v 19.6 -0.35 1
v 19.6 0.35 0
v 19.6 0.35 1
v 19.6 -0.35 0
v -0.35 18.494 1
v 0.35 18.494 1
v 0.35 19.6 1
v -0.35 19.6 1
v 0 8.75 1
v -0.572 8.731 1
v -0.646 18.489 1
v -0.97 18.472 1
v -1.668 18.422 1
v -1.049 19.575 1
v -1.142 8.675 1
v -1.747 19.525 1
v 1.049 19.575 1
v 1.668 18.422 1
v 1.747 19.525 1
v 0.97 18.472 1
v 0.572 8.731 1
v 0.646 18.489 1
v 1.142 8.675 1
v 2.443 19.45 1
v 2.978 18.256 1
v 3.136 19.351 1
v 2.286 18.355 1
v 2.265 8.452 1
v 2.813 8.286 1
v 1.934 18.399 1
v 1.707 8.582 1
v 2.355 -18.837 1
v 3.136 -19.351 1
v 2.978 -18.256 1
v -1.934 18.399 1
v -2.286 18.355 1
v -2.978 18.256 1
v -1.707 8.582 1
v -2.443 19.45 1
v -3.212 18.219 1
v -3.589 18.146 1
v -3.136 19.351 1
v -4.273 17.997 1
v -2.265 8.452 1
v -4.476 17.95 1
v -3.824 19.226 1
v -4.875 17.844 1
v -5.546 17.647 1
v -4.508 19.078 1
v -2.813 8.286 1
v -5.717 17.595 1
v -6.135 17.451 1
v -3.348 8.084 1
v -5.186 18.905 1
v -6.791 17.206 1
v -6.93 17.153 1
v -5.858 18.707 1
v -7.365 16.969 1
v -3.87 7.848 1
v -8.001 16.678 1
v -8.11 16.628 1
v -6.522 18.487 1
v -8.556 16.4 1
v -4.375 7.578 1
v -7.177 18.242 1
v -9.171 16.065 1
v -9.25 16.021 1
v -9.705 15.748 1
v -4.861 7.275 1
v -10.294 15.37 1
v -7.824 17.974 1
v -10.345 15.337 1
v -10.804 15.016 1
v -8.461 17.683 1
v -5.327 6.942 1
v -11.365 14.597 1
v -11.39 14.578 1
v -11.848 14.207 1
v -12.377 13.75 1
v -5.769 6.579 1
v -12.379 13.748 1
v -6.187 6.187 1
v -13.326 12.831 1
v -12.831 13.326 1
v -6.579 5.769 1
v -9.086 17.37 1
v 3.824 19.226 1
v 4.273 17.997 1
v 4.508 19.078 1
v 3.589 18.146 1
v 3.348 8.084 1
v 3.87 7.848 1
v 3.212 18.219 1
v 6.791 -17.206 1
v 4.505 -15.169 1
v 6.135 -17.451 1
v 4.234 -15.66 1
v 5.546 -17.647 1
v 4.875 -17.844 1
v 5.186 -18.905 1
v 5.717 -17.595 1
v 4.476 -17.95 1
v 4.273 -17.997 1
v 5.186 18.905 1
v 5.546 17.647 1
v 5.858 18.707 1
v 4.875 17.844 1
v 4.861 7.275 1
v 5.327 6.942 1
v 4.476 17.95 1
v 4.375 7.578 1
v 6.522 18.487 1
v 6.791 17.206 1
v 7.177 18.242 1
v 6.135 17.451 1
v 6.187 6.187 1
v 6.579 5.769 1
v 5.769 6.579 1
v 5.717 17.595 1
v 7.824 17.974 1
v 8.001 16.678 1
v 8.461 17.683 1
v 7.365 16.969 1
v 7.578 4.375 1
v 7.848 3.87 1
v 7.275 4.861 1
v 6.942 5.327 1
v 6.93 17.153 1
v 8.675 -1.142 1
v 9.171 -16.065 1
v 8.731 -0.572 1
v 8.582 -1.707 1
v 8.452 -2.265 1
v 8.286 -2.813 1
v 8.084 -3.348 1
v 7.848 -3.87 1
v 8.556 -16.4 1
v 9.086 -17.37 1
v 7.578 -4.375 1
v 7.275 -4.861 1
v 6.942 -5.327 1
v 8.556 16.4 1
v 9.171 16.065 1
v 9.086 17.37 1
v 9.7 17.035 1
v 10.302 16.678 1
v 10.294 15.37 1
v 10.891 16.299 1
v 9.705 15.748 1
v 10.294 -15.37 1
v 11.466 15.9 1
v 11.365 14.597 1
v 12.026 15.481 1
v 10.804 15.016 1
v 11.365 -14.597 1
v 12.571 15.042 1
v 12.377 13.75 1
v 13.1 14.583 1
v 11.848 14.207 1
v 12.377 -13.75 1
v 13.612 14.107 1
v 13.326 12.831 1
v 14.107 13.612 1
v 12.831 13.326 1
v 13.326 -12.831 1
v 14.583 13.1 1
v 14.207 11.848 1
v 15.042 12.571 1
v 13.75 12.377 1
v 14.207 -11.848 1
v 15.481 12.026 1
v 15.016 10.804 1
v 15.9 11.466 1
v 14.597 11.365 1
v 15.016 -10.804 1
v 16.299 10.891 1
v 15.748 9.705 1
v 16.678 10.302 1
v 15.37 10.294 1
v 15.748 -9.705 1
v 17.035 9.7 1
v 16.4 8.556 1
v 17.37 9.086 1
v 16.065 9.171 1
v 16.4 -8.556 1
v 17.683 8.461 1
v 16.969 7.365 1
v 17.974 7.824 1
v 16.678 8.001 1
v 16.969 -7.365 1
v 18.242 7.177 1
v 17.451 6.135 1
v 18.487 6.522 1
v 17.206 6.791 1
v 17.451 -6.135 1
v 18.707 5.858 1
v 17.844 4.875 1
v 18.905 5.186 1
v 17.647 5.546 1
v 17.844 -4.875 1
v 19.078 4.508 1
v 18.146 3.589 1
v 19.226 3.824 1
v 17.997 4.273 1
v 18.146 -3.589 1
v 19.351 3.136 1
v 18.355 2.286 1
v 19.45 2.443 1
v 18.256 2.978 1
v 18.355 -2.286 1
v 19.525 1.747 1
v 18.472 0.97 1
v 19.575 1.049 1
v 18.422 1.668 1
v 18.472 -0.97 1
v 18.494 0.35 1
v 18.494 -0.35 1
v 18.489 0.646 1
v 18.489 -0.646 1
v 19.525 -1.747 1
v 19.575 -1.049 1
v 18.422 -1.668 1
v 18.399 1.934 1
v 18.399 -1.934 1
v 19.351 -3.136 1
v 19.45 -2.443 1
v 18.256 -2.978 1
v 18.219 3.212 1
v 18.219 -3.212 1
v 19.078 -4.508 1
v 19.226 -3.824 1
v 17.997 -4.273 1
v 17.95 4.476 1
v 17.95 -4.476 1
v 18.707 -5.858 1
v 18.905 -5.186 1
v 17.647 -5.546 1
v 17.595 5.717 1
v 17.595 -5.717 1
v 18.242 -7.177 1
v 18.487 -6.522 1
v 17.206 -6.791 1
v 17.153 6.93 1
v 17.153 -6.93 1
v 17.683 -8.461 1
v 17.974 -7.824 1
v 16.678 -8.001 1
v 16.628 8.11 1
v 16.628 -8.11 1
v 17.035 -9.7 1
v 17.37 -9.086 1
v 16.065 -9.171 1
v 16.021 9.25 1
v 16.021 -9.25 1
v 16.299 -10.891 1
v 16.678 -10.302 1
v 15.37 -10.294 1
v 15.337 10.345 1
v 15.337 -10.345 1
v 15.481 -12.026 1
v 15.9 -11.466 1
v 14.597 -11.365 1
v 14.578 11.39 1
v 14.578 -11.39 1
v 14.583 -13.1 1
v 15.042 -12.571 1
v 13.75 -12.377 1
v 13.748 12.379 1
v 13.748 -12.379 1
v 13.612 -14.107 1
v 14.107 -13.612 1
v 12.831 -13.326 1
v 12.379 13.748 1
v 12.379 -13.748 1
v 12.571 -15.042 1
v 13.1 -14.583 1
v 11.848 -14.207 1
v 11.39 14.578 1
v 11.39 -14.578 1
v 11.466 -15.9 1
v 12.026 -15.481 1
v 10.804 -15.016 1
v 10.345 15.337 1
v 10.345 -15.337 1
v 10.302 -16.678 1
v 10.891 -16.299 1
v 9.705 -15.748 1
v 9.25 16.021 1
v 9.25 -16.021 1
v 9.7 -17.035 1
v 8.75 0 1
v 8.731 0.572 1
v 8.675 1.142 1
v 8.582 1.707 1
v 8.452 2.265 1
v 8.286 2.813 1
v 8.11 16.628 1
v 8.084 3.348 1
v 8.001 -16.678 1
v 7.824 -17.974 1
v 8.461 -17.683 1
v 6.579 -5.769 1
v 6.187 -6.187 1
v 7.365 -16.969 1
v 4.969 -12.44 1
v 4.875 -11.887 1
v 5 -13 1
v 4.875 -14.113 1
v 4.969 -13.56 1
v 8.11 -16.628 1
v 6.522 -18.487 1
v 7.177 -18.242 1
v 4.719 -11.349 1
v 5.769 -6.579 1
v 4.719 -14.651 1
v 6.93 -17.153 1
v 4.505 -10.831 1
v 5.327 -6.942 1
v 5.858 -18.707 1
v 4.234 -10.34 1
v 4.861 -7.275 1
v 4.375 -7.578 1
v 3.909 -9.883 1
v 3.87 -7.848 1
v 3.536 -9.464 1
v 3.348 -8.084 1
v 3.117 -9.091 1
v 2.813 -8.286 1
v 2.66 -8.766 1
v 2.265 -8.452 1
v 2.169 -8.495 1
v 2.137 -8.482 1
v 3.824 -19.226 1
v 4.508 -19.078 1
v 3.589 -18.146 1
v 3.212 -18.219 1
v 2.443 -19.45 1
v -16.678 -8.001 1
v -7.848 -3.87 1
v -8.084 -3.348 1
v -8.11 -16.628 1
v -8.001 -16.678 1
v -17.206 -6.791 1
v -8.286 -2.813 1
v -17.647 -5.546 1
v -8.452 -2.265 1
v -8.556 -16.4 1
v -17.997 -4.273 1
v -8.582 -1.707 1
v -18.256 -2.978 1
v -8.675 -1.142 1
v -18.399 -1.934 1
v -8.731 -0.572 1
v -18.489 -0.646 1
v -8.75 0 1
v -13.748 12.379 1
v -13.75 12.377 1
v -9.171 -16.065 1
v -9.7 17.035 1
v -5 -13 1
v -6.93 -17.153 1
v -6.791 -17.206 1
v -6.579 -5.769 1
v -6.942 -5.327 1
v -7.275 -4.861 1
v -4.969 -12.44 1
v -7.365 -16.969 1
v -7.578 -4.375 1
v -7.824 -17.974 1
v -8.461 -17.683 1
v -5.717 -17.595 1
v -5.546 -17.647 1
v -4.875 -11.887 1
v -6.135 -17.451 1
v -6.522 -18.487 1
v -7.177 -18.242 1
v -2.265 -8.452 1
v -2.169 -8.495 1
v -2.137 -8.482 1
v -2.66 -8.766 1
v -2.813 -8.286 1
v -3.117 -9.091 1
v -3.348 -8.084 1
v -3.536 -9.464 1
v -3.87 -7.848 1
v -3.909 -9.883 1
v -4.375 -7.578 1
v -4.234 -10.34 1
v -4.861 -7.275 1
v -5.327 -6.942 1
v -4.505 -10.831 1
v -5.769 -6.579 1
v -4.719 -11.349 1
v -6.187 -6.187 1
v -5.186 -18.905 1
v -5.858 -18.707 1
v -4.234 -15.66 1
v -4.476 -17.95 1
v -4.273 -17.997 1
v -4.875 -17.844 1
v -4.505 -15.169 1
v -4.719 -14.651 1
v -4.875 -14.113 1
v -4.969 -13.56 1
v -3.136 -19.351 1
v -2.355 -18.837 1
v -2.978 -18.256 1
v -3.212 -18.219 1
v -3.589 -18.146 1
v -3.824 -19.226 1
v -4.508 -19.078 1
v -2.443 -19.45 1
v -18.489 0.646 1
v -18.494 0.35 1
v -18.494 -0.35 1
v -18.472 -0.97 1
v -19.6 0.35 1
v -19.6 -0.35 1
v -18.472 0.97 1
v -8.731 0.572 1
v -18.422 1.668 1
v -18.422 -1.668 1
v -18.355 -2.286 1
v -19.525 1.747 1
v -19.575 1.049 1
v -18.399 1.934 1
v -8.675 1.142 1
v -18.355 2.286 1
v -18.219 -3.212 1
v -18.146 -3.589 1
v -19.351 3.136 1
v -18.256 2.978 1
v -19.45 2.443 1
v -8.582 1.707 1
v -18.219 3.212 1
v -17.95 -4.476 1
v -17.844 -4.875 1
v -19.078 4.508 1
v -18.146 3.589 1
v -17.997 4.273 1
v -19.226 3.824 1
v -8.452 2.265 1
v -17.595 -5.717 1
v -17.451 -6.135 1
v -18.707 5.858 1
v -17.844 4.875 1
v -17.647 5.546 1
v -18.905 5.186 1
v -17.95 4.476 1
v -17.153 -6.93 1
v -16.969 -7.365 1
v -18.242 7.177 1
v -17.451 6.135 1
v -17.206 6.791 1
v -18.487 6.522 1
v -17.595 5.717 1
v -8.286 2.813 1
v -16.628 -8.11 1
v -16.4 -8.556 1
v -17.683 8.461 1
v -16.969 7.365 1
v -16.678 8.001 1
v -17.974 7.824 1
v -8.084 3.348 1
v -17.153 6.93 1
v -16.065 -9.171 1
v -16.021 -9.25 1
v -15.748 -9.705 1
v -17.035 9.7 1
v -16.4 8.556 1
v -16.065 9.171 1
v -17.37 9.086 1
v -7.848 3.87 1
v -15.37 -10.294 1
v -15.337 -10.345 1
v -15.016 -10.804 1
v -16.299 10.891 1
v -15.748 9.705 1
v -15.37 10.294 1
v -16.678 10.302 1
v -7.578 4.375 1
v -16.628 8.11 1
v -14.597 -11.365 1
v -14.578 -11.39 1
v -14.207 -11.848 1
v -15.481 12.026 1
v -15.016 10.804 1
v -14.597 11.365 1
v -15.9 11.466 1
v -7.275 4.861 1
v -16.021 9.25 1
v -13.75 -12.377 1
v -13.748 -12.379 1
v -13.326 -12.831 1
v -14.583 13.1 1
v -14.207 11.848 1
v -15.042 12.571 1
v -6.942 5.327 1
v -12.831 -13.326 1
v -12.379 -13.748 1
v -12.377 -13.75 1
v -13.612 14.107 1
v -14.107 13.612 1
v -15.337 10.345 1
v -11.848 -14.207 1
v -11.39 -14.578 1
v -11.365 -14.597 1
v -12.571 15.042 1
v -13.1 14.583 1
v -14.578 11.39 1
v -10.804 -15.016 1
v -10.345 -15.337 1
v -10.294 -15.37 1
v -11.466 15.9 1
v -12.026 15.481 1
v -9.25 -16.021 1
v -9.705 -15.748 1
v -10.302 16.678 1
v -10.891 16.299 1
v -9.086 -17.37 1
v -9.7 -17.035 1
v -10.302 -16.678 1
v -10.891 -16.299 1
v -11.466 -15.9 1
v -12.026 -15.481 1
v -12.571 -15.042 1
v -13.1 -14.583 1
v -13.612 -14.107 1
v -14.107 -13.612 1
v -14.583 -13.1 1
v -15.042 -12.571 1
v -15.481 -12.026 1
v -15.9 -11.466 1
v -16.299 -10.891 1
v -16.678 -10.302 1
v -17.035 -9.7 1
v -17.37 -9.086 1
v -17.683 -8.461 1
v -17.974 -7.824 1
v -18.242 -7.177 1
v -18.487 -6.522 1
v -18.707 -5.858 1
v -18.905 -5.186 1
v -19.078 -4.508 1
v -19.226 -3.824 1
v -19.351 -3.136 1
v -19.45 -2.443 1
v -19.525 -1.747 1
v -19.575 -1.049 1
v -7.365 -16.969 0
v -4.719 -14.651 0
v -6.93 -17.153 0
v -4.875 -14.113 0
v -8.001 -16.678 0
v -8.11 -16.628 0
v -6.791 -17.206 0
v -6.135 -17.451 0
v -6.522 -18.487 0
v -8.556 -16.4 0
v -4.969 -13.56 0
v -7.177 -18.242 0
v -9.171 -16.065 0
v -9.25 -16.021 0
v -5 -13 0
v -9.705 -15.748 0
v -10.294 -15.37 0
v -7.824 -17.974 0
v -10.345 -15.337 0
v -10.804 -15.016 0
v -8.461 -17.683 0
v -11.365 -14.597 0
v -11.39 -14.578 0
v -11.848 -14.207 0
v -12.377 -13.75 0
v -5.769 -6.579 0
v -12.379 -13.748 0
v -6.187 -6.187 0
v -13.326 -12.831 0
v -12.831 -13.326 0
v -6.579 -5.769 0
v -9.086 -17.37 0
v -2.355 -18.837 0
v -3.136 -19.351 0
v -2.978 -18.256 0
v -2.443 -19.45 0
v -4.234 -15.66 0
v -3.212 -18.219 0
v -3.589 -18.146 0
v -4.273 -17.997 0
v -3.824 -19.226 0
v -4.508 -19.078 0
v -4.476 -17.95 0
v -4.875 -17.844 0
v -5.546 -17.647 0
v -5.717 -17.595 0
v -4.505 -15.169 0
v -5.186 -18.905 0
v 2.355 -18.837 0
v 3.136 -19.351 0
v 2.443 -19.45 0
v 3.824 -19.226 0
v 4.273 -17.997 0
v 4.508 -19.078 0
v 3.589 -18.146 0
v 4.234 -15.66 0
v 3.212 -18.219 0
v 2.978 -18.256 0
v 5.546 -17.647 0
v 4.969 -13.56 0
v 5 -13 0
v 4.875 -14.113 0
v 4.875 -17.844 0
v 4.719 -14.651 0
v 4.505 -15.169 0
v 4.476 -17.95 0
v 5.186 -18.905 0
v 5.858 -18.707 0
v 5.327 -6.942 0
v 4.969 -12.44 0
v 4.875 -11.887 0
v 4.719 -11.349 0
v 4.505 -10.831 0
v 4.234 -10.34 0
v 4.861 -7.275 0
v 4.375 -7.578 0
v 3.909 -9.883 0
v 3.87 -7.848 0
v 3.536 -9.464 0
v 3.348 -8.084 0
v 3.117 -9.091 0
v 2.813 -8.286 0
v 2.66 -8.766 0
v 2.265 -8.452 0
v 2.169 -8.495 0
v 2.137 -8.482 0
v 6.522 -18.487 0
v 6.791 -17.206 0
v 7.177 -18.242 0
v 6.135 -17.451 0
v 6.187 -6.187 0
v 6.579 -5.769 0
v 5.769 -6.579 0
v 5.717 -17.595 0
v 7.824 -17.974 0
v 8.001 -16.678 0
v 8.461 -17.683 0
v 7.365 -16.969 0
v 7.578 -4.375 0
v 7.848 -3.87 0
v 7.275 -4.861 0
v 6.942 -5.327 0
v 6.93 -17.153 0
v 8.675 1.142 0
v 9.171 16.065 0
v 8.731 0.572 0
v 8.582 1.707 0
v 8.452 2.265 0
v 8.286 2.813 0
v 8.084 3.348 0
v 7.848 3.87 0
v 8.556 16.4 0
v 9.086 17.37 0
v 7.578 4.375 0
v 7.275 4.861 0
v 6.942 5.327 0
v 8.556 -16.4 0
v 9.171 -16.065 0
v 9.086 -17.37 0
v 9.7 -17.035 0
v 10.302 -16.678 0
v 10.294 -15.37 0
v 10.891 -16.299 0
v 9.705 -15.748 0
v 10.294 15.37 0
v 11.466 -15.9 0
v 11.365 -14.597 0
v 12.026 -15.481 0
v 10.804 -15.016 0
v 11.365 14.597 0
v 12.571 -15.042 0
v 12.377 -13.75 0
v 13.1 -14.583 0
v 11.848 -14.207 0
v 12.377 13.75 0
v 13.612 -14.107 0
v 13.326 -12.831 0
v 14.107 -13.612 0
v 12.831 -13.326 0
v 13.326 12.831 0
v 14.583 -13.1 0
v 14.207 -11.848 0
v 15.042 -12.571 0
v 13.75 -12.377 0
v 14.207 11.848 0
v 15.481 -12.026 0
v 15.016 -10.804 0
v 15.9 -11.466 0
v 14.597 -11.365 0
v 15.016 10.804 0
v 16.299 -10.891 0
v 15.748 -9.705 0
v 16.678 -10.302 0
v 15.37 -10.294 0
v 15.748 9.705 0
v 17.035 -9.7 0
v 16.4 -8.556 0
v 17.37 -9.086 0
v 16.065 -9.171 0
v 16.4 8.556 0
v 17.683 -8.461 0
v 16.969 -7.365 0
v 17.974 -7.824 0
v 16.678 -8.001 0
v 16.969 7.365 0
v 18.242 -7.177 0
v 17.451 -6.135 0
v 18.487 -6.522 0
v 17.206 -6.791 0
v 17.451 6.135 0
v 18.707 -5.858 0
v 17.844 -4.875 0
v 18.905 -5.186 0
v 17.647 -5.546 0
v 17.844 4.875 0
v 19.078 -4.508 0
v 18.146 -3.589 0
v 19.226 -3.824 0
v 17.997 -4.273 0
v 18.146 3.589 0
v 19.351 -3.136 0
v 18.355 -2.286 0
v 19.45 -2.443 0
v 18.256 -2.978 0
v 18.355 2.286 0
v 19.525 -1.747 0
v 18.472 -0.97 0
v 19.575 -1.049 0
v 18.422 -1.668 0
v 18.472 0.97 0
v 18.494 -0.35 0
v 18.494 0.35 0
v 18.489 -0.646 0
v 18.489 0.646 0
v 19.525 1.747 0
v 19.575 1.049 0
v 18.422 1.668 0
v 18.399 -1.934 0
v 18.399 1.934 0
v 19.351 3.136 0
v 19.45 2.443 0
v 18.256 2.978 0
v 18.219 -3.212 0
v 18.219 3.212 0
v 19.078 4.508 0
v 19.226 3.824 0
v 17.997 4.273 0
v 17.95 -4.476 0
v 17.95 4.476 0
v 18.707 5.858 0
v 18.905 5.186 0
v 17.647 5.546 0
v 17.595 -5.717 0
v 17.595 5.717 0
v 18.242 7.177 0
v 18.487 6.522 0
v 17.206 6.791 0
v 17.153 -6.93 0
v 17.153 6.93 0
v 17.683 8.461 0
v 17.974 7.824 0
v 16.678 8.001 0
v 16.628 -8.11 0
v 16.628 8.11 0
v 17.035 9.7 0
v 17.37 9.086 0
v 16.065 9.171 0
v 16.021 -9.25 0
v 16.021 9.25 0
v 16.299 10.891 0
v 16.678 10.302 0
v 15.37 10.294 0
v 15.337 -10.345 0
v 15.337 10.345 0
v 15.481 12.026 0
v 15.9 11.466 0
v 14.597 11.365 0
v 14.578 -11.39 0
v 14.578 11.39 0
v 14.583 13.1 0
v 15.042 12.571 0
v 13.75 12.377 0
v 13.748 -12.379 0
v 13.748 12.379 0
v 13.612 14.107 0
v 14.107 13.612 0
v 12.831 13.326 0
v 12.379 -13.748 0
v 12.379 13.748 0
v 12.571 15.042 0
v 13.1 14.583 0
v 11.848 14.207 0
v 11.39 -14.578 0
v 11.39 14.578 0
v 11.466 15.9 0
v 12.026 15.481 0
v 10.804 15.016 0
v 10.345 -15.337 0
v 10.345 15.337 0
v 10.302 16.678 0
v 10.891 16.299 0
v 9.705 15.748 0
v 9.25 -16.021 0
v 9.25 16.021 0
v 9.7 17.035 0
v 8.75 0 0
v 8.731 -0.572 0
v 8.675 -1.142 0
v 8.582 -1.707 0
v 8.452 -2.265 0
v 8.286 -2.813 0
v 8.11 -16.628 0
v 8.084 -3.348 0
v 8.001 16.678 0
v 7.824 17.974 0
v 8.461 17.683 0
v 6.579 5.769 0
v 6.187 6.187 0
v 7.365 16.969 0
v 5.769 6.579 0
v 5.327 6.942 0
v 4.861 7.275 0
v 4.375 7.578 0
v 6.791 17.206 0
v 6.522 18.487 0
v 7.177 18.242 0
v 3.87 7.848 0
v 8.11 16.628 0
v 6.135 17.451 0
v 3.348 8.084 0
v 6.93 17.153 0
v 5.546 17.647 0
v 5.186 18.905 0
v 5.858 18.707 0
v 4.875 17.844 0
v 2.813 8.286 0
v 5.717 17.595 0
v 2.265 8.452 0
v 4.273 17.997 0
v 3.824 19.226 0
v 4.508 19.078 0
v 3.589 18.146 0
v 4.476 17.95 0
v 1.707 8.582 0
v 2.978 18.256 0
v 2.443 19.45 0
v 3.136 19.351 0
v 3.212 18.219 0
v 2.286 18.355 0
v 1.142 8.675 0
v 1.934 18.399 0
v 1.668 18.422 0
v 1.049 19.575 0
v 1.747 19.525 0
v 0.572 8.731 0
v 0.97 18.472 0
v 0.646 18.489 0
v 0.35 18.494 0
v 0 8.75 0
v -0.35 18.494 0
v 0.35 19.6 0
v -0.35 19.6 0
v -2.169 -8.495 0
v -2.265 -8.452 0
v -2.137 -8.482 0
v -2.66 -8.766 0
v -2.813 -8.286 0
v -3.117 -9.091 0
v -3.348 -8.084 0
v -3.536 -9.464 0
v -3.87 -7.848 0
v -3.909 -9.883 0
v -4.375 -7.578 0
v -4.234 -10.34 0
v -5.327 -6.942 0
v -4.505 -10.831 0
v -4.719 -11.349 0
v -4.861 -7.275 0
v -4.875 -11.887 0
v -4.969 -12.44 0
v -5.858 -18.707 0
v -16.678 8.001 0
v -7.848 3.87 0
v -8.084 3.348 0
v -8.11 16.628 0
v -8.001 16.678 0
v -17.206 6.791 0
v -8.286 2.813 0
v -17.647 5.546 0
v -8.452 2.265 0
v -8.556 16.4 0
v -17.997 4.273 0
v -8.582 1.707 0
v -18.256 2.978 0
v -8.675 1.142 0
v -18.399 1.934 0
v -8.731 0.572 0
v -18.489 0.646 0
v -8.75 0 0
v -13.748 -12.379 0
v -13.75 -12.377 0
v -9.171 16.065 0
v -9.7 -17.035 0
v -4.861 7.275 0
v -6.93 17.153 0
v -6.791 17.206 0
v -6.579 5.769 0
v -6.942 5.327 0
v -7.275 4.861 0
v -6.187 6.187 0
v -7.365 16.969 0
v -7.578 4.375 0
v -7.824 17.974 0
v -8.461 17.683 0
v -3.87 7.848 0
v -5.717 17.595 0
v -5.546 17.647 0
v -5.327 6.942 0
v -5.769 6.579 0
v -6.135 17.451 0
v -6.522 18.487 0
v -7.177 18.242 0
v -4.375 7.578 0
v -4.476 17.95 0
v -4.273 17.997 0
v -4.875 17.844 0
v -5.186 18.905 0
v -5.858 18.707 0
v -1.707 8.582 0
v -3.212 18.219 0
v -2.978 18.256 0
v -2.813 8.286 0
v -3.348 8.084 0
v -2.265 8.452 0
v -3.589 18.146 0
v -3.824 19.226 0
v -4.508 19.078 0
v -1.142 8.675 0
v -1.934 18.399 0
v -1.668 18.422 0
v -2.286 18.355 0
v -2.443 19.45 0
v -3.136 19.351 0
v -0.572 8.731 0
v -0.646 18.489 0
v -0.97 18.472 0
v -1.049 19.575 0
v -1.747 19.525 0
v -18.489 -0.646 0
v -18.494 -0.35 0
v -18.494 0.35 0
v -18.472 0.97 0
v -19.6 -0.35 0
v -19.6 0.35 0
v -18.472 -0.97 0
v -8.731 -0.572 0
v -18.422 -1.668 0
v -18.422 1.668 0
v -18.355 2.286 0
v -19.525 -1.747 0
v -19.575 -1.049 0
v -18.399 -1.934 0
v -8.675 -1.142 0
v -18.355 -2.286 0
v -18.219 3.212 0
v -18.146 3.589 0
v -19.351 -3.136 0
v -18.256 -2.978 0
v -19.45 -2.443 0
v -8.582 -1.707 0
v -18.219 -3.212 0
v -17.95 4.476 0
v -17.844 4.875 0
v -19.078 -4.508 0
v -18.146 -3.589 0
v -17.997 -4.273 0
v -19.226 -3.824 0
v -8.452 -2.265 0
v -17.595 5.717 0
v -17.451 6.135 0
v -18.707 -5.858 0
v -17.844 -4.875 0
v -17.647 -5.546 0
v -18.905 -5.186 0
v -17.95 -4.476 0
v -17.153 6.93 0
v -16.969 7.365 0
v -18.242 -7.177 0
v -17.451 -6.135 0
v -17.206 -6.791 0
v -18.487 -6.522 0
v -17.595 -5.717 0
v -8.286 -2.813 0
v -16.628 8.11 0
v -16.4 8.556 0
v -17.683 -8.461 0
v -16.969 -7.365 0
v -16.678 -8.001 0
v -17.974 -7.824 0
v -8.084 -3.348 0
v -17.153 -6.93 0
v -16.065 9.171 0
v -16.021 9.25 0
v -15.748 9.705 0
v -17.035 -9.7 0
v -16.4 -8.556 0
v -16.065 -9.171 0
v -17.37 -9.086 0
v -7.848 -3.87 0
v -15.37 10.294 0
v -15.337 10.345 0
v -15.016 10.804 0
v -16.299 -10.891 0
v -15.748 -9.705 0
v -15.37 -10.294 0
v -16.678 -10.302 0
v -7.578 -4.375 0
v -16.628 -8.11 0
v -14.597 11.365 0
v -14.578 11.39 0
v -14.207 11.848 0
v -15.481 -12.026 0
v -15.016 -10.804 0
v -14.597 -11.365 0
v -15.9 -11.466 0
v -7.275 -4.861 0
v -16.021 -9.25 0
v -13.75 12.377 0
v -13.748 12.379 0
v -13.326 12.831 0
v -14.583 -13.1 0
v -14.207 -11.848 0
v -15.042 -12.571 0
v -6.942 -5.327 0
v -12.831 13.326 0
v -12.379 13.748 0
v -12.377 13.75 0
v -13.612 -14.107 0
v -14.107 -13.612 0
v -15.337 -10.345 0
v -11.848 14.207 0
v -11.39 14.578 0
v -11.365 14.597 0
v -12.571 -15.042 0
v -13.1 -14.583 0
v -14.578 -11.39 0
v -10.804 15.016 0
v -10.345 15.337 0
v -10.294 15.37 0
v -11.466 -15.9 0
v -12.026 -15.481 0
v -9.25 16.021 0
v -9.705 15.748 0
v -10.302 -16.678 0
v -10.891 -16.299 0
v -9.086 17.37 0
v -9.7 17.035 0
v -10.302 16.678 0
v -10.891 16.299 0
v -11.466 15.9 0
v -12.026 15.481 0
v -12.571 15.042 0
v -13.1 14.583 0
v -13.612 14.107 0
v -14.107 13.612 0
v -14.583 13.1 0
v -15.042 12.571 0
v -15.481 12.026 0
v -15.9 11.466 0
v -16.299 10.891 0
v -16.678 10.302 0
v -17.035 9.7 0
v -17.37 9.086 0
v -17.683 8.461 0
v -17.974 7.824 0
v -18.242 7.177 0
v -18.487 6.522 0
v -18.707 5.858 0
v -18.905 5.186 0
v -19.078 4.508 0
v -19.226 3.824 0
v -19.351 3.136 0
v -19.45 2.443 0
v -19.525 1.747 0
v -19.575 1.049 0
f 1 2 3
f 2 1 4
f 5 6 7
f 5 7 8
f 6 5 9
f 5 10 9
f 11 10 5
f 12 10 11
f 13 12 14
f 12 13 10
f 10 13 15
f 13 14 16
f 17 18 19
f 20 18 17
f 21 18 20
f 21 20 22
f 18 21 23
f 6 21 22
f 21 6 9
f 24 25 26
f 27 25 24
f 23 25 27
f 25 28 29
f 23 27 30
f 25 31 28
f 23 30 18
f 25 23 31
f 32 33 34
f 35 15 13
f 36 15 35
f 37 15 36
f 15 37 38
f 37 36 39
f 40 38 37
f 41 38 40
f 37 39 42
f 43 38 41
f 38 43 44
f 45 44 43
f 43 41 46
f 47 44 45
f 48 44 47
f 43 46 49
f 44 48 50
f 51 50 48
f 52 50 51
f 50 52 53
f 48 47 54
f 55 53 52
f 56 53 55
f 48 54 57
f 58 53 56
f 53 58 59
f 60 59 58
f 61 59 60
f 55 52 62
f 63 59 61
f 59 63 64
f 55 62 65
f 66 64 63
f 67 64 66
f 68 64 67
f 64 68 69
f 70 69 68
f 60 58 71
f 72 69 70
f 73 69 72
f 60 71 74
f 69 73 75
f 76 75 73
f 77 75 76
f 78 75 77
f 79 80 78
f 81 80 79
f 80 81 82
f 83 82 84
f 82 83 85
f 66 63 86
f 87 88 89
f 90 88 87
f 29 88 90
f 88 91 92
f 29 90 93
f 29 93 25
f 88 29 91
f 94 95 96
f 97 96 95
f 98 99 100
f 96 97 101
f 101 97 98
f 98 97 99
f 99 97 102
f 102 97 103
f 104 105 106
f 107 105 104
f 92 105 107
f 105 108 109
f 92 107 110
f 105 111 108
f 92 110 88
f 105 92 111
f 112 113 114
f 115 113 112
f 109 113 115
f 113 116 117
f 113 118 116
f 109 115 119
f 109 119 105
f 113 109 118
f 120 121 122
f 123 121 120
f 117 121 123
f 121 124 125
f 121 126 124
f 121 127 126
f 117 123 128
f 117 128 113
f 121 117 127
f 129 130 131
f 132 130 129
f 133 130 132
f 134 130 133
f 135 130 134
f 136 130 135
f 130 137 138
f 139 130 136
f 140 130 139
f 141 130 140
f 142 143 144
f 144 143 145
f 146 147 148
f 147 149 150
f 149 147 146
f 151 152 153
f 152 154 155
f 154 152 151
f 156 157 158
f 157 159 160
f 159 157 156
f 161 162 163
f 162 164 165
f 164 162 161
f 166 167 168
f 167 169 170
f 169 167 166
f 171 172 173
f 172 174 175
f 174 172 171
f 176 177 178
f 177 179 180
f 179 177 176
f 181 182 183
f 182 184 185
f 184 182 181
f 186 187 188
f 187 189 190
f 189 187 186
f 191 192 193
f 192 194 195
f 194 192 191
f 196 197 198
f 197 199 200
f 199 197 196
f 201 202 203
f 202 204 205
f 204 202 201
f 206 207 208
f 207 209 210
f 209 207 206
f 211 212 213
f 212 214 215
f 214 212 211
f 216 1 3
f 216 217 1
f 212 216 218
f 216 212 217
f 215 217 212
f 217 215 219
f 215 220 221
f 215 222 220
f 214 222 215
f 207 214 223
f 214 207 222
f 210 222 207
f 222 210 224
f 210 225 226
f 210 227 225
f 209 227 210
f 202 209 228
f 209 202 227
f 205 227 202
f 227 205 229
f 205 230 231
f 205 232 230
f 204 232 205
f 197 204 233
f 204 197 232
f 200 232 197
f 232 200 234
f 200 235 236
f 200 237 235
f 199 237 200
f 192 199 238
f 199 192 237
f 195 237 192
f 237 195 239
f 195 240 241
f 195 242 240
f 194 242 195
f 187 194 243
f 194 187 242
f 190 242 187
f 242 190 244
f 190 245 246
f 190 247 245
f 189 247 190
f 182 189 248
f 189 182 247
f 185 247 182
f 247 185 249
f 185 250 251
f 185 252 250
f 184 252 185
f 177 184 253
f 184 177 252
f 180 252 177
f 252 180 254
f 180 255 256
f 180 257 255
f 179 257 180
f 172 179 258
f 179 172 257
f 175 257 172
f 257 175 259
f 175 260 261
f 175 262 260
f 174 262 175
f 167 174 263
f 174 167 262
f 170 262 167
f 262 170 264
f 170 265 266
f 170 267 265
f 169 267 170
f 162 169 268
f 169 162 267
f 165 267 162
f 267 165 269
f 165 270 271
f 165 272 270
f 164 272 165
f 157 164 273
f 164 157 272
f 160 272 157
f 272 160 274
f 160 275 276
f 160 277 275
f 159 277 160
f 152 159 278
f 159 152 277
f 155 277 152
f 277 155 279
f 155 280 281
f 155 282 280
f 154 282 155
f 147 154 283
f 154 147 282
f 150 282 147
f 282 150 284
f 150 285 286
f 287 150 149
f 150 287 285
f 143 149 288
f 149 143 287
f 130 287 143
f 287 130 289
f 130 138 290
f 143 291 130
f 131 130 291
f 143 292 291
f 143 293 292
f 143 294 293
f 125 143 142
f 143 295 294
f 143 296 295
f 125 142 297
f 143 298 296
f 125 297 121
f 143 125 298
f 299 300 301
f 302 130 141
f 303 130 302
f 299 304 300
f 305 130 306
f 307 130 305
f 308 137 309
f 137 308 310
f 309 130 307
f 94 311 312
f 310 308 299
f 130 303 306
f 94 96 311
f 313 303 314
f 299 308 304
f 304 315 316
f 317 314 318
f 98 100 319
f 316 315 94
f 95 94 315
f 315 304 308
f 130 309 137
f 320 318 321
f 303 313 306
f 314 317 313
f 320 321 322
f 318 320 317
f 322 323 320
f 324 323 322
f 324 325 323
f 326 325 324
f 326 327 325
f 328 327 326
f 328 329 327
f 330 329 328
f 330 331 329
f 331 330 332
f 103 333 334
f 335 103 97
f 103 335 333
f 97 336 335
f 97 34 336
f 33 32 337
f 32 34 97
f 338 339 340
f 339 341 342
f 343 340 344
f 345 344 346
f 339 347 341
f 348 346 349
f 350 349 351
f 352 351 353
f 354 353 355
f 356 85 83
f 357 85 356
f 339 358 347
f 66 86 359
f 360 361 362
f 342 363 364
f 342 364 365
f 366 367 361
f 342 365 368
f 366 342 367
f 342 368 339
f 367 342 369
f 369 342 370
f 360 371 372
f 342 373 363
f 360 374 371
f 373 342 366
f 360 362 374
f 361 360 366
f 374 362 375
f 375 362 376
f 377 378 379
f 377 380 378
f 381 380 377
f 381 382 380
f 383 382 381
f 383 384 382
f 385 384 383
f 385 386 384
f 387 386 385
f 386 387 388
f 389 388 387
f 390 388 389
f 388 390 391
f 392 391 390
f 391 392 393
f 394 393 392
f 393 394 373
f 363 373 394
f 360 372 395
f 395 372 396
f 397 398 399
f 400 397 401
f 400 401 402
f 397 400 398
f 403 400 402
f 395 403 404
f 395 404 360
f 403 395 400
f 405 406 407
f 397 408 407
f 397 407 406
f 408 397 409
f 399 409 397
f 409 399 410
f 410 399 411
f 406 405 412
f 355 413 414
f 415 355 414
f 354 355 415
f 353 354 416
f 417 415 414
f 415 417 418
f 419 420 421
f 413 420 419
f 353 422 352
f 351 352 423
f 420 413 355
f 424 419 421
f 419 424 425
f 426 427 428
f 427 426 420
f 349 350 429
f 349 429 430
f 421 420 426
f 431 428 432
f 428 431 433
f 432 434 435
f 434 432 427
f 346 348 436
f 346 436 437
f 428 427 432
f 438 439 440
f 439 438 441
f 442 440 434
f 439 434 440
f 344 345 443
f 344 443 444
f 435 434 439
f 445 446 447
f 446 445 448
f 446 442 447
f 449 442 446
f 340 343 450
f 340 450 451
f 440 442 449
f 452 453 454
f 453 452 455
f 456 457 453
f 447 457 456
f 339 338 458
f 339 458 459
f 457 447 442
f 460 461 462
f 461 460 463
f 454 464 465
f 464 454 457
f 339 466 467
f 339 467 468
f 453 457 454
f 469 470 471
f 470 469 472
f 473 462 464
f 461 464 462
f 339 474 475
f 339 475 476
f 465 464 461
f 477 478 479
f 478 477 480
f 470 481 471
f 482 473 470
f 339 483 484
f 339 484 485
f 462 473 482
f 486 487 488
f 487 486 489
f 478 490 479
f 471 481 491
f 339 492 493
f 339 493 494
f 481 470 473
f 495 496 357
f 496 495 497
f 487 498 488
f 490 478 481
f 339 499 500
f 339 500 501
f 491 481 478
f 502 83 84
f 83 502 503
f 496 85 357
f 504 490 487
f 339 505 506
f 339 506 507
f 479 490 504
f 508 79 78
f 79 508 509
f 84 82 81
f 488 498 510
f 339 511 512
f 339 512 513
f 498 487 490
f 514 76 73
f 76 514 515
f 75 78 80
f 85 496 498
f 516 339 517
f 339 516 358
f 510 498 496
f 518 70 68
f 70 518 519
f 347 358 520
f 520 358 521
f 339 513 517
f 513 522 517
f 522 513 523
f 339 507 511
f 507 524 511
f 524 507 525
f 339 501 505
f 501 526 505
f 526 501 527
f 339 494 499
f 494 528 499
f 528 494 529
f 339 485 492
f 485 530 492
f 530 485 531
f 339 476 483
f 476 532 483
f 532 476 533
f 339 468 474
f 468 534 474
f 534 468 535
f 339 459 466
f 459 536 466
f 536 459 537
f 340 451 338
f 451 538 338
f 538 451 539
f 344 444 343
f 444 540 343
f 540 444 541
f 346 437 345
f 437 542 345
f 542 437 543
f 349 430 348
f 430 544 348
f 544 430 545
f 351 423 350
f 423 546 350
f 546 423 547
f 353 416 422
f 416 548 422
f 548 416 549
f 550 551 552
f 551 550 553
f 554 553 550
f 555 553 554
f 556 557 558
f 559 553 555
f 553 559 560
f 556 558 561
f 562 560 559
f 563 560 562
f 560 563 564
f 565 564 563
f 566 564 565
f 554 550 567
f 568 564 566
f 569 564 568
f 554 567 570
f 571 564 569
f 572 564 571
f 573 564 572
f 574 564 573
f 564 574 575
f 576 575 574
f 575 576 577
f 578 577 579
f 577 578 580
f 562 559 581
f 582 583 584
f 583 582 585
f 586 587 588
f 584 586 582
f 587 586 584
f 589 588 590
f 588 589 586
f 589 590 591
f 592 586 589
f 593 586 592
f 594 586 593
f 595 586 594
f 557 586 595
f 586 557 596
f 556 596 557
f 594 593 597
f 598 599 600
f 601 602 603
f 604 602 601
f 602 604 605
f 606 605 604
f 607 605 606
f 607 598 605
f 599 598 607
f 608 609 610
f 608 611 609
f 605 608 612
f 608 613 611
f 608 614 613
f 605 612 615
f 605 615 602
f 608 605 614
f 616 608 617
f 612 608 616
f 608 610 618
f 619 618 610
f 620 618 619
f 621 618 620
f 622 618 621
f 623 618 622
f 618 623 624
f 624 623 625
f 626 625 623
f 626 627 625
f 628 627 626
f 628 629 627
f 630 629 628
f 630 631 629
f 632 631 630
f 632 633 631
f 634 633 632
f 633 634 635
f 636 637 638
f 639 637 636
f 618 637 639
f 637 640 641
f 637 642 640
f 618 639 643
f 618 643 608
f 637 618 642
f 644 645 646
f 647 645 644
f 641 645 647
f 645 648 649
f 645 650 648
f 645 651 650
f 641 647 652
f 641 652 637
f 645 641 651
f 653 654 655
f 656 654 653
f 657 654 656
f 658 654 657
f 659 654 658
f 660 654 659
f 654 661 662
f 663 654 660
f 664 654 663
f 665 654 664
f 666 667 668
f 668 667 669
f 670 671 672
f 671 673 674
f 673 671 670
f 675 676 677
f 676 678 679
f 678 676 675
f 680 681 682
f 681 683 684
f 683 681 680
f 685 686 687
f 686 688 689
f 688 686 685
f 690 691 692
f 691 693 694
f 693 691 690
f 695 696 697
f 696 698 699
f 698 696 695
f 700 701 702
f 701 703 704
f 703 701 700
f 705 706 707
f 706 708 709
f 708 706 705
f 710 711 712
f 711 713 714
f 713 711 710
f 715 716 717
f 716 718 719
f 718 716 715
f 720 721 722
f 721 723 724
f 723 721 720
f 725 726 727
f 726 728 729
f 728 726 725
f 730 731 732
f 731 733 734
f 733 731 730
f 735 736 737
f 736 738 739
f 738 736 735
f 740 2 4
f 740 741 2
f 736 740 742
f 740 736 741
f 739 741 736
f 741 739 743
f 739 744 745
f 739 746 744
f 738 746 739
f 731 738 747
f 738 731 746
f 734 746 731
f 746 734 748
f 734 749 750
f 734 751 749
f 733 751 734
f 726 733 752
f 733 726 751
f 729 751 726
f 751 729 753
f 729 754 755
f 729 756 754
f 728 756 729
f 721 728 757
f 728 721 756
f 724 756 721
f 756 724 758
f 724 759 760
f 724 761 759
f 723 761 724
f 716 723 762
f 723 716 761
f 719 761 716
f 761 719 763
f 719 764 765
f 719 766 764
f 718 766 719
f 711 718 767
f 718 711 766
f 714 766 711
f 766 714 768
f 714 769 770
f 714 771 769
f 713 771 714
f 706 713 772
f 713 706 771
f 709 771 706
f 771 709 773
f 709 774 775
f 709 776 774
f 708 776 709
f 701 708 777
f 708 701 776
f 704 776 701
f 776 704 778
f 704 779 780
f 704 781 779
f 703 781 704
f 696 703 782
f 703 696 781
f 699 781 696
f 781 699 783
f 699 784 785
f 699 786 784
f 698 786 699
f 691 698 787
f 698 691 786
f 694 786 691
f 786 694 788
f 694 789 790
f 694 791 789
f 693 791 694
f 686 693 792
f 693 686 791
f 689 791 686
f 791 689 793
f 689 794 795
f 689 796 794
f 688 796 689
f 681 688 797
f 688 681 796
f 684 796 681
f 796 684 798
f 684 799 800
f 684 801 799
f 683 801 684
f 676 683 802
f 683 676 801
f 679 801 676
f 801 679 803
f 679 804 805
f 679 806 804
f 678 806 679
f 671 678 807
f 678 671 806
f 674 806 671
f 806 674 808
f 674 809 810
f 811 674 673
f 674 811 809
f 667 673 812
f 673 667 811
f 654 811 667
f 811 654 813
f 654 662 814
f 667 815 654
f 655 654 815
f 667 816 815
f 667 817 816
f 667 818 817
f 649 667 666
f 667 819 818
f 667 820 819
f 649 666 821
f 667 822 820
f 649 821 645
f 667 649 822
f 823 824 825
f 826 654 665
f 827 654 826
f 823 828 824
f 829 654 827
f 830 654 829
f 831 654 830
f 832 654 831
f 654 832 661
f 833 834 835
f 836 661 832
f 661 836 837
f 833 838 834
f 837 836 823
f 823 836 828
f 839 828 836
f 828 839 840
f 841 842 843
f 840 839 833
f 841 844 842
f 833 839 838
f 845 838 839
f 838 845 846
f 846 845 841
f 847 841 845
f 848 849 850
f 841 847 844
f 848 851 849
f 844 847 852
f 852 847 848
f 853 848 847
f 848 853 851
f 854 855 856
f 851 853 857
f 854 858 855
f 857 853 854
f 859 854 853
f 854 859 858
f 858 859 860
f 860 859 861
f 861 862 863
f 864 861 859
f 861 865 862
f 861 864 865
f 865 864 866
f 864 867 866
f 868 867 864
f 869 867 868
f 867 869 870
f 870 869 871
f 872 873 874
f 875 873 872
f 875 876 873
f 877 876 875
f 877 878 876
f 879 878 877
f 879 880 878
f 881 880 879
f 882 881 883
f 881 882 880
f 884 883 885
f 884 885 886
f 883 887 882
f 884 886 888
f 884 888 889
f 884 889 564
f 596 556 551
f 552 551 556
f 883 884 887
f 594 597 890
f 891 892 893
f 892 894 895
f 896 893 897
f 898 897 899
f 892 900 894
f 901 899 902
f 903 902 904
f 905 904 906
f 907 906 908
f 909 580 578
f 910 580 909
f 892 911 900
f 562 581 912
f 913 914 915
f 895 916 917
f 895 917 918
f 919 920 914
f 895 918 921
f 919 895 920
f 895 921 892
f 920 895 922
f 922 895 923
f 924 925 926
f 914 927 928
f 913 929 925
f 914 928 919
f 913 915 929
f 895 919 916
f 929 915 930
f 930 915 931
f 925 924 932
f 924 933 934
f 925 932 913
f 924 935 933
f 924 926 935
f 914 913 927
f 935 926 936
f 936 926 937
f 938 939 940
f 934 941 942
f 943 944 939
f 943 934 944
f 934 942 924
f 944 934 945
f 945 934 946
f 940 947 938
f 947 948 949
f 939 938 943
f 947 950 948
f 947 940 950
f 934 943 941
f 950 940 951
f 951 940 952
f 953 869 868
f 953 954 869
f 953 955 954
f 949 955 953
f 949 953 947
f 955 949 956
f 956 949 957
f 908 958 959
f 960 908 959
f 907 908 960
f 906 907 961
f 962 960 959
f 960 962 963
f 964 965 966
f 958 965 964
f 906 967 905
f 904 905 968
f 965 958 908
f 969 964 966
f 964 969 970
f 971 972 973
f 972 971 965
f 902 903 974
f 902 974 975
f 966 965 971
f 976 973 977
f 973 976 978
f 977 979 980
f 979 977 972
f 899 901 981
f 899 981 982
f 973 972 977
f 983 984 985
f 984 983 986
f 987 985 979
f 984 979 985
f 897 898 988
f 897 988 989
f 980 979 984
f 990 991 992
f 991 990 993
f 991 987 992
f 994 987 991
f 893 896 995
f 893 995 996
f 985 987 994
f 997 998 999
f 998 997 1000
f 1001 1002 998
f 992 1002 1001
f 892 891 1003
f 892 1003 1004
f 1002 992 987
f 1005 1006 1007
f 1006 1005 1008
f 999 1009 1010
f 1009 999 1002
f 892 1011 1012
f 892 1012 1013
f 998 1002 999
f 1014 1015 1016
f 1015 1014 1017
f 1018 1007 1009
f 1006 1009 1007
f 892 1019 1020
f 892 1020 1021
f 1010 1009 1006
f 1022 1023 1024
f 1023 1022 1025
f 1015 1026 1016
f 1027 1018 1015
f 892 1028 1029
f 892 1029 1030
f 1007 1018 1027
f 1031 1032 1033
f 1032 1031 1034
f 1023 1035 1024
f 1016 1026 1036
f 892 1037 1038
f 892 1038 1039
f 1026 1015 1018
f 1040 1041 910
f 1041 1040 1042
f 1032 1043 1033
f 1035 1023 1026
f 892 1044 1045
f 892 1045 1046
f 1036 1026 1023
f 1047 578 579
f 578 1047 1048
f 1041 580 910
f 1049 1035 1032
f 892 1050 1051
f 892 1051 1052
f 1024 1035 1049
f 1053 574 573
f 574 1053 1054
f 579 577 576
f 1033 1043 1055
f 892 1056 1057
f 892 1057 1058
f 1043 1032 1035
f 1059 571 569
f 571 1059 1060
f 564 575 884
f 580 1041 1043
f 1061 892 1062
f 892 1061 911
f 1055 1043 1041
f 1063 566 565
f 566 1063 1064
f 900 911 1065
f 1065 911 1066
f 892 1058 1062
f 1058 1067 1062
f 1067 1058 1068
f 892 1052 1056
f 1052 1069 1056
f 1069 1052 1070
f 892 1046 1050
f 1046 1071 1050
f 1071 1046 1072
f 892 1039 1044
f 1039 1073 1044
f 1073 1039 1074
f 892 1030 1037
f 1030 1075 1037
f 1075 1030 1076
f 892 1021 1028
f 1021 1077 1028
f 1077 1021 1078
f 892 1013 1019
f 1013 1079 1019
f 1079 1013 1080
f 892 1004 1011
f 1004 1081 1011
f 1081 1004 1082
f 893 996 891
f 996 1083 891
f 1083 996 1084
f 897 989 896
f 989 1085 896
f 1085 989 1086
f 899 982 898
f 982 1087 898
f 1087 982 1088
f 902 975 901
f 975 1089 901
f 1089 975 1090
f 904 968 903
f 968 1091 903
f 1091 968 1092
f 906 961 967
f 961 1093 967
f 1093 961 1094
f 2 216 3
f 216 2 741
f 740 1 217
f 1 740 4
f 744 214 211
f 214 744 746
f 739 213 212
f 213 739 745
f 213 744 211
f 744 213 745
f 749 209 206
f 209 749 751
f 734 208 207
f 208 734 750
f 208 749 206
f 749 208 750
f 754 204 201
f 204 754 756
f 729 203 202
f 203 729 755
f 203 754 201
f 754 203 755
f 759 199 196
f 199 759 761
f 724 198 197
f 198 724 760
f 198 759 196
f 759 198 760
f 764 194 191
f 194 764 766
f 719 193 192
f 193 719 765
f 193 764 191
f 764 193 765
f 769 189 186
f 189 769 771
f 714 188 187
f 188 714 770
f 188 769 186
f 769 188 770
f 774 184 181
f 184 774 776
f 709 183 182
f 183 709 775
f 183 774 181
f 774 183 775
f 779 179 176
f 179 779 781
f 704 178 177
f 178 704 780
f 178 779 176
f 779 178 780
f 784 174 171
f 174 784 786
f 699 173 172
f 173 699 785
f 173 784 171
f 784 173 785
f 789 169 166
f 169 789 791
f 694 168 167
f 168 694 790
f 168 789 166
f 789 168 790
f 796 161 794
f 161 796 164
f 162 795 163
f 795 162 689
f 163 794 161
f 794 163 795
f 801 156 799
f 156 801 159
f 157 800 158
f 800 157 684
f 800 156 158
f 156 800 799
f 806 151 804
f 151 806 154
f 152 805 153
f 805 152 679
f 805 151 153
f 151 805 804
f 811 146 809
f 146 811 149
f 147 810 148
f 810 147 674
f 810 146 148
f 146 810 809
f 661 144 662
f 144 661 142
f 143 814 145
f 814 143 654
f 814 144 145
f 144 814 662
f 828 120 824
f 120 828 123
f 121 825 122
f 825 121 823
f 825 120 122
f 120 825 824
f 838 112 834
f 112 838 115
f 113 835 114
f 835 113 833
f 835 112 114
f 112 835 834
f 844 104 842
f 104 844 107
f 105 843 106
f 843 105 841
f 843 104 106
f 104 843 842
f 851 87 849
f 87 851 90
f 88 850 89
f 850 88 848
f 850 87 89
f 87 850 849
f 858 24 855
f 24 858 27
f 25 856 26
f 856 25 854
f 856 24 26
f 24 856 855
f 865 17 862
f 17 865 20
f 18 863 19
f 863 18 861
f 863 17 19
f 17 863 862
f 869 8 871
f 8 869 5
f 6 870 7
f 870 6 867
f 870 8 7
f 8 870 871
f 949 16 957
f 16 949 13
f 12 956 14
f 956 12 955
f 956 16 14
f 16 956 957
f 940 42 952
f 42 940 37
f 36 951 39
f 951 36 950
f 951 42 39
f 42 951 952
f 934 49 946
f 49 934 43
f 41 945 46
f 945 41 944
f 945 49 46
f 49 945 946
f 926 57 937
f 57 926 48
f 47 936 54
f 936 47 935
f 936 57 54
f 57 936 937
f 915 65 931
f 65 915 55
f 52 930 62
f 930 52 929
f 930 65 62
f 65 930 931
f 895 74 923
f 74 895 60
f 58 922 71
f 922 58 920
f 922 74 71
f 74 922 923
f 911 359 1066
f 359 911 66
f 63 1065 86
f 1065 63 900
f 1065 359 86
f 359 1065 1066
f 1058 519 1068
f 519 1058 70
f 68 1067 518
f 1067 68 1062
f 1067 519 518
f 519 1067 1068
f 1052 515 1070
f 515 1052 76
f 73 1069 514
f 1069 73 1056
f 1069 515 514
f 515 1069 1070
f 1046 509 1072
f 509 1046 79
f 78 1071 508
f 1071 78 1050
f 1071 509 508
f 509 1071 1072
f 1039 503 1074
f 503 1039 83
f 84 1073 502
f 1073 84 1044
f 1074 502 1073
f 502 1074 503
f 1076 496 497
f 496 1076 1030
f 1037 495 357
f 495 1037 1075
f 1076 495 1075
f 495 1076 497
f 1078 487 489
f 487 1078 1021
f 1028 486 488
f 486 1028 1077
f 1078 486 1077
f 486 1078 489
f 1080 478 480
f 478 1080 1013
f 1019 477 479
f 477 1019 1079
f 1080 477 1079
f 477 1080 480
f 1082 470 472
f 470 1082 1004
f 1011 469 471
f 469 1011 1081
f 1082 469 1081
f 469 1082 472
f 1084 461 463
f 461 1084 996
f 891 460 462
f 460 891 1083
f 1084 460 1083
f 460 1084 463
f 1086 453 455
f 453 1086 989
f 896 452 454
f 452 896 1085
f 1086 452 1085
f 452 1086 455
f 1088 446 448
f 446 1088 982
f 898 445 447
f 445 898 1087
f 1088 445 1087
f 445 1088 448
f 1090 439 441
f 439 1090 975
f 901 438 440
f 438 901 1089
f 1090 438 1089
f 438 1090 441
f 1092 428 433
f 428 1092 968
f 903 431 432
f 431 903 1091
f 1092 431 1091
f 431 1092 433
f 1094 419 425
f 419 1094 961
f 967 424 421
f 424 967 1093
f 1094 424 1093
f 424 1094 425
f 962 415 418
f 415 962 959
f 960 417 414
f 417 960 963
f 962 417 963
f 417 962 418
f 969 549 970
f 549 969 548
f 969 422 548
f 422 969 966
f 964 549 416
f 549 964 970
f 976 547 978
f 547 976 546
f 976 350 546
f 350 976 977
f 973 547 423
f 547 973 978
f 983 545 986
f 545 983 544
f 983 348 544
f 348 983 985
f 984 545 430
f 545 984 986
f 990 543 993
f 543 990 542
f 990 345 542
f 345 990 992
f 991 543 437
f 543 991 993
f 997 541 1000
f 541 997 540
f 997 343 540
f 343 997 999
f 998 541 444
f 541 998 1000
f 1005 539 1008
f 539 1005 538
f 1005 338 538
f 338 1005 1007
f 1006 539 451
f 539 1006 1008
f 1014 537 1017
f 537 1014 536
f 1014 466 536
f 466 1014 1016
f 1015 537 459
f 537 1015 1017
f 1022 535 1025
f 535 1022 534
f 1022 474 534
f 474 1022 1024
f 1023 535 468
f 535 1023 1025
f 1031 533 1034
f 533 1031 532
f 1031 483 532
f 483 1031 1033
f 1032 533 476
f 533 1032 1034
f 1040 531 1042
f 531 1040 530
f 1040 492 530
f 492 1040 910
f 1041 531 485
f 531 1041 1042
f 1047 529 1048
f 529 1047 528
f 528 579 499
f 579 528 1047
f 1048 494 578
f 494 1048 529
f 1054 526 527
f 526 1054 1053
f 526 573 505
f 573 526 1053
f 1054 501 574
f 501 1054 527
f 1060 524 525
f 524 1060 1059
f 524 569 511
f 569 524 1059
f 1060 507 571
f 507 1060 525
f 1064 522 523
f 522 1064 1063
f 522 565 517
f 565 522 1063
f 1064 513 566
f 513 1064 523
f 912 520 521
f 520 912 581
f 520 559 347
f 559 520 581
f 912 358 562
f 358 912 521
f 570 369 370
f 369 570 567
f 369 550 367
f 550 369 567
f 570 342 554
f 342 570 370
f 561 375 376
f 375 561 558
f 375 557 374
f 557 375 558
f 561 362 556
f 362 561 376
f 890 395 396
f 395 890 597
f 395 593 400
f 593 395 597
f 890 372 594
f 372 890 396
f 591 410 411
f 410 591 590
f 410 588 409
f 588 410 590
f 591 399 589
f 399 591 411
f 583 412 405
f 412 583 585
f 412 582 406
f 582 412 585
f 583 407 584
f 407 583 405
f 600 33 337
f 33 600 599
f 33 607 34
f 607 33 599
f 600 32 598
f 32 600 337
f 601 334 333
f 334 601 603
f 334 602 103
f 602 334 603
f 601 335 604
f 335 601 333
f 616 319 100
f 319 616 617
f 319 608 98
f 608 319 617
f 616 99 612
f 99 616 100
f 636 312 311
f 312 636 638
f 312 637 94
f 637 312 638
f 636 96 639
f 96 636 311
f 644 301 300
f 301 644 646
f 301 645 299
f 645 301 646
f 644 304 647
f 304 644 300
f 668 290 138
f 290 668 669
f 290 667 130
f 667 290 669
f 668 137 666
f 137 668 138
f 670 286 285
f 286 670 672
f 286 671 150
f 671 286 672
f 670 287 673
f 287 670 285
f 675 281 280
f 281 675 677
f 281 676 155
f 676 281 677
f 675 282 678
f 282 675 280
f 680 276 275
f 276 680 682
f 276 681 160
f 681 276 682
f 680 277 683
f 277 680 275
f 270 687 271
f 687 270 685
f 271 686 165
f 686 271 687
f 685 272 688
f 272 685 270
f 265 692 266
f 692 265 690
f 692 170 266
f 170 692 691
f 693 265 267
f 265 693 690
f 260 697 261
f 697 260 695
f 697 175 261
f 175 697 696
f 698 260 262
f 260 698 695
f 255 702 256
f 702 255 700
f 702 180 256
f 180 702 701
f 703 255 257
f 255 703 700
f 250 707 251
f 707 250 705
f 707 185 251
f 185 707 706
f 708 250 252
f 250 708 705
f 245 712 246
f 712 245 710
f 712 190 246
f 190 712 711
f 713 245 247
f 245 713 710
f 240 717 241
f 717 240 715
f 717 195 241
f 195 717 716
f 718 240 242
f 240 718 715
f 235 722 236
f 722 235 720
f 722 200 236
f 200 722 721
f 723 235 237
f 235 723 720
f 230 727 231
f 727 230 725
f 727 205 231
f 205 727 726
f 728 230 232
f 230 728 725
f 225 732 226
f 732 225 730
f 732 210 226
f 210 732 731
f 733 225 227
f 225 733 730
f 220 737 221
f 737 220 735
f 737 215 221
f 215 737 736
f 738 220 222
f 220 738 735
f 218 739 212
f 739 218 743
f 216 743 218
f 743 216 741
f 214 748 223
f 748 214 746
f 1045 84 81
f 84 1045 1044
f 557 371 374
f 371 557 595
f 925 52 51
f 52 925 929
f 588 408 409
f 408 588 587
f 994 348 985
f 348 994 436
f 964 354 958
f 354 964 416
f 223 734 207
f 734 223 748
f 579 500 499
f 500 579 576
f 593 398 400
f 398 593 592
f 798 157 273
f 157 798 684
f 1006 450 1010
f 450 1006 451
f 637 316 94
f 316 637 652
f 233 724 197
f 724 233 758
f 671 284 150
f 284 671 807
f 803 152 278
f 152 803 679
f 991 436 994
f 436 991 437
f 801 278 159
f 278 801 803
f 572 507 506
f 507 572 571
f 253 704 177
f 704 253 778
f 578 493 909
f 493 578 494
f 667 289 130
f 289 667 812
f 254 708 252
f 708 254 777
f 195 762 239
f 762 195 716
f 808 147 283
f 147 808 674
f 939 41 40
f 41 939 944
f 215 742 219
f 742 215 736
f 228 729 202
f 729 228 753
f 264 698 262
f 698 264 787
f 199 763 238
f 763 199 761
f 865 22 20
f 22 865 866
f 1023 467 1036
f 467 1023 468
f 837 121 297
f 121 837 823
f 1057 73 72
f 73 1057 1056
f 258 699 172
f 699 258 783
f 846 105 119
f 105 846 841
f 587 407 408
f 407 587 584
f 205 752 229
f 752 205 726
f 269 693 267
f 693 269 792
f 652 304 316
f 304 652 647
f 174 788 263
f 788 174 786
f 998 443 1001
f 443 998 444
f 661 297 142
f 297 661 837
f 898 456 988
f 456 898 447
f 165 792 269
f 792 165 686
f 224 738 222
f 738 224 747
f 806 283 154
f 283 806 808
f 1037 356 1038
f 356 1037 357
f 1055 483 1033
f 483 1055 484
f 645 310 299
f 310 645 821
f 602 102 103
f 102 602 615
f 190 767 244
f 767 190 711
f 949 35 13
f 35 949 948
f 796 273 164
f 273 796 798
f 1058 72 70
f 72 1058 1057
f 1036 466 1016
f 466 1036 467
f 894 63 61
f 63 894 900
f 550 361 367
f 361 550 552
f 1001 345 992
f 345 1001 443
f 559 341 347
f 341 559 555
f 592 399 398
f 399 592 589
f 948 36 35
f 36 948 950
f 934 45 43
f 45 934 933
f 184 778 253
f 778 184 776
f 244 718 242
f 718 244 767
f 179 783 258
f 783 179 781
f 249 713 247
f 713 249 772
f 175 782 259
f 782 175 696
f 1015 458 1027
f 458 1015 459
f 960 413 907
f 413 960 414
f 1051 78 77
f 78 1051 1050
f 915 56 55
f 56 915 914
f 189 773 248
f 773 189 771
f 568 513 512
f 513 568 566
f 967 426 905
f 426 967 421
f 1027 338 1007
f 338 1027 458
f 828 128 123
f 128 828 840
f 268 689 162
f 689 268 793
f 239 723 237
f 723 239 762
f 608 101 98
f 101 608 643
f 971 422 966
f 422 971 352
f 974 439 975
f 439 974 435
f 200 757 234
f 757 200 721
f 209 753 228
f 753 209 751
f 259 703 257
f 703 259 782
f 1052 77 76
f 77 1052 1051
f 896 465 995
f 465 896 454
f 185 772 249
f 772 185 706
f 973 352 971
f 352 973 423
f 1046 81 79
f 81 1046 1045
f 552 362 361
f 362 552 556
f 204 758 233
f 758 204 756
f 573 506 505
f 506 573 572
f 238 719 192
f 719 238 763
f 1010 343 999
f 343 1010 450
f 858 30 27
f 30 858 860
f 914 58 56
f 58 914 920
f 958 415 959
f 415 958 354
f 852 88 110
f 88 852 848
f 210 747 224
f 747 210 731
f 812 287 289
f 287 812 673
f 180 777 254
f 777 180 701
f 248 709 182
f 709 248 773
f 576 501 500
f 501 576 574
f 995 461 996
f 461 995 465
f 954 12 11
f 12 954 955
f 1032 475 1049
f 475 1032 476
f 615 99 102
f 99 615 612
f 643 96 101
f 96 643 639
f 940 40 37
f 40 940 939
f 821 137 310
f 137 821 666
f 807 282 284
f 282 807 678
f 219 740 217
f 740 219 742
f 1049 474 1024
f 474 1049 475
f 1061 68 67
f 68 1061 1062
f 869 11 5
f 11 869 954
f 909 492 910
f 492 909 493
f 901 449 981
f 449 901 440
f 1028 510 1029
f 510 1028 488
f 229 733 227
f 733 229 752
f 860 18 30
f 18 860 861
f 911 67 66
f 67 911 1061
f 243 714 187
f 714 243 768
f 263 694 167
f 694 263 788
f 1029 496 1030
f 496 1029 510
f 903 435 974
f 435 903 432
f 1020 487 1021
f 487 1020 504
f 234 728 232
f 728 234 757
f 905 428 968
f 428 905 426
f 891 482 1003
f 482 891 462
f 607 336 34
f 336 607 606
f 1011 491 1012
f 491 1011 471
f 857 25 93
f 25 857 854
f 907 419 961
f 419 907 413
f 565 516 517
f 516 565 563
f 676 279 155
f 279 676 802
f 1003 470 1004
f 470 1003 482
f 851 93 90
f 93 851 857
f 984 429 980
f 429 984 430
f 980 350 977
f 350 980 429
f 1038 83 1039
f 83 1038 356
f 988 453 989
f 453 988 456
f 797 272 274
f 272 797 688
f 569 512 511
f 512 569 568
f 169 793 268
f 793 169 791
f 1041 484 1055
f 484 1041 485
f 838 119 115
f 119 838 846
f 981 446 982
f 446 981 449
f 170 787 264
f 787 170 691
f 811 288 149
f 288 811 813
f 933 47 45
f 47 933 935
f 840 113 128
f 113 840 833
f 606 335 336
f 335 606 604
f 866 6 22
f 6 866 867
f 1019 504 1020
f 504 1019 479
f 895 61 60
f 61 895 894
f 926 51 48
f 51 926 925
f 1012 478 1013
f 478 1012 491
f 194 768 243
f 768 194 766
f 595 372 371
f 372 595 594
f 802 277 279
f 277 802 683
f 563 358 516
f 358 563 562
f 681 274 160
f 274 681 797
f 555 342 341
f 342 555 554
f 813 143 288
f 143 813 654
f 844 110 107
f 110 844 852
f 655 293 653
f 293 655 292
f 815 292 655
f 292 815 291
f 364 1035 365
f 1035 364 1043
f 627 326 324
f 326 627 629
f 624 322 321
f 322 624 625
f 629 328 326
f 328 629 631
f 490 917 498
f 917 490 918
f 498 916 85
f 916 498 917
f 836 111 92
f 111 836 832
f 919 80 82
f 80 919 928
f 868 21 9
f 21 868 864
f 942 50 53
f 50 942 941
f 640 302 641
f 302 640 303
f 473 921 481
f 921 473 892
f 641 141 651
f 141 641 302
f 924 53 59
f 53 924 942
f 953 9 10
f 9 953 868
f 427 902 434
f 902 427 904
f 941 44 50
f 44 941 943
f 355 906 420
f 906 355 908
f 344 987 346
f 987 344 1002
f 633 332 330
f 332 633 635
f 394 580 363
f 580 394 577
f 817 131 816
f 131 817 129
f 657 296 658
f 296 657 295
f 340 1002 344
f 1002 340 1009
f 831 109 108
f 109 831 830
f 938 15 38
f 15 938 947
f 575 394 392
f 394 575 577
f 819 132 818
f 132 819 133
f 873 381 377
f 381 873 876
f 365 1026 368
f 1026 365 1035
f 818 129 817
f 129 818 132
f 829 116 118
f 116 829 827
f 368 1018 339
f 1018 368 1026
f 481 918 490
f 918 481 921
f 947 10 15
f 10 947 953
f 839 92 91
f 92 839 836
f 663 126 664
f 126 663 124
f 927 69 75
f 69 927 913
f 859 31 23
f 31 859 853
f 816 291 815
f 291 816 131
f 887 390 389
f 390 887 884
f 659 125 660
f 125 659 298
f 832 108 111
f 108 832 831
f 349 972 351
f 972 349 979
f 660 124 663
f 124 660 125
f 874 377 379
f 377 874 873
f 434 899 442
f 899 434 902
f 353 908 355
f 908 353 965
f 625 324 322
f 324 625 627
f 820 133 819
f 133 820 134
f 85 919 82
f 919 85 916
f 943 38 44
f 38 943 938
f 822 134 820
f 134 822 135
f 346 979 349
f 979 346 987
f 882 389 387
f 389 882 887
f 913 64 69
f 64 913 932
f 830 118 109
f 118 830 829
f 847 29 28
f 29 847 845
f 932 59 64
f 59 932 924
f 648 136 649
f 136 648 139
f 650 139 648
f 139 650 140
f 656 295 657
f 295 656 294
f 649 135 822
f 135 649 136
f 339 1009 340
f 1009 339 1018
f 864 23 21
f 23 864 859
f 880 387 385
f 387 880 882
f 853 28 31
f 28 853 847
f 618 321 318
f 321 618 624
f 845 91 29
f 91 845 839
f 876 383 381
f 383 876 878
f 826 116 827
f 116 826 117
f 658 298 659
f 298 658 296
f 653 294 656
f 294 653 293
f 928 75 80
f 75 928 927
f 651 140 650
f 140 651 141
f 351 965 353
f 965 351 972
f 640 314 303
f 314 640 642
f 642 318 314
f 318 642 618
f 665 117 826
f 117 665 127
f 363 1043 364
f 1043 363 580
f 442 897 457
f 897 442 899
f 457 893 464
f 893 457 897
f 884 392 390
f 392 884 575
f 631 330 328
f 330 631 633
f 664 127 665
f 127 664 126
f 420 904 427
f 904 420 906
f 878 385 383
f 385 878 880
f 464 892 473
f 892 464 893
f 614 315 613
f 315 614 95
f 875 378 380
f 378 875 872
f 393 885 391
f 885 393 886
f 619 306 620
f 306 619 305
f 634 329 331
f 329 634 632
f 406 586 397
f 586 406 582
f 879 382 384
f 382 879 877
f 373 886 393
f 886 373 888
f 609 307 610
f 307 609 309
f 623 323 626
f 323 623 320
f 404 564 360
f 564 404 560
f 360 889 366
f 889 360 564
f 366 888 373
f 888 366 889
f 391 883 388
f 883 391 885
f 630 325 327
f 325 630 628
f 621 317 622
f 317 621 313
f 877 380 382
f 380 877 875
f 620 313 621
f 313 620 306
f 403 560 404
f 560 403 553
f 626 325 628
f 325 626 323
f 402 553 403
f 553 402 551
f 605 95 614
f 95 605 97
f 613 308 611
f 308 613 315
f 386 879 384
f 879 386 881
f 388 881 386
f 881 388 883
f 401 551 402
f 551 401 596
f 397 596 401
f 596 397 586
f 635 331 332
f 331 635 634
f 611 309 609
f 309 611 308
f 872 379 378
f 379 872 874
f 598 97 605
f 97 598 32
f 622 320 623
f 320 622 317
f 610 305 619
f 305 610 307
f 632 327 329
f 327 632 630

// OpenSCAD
// part_id: mar4
// name: Mars gear with slotted window
// source_drawing_ids: DRW-013
// units: mm
// revision: 0.1
// SPDX-License-Identifier: MIT

module mar4_tooth_ring(root_d = 37.0, tip_d = 39.16, tooth_count = 88, thickness = 1.0, tooth_w = 0.70) {
    union() {
        cylinder(d = root_d, h = thickness, center = false, $fn = 180);
        for (a = [0 : 360 / tooth_count : 360 - 360 / tooth_count]) {
            rotate([0, 0, a])
                translate([root_d / 2 - 0.02, -tooth_w / 2, 0])
                    cube([(tip_d - root_d) / 2 + 0.04, tooth_w, thickness], center = false);
        }
    }
}

module part_mar4(
    root_d = 37.0,
    tip_d = 39.16,
    tooth_count = 88,
    thickness = 1.0,
    bore_d = 17.5,
    rivet_d = 1.5,
    rivet_r = 14.0,
    cut_d = 10.0,
    cut_r = 13.0,
    cut_a = -90
) {
    difference() {
        mar4_tooth_ring(root_d = root_d, tip_d = tip_d, tooth_count = tooth_count, thickness = thickness);
        translate([0, 0, -0.05]) cylinder(d = bore_d, h = thickness + 0.1, $fn = 96);
        translate([rivet_r * cos(-80), rivet_r * sin(-80), -0.05]) cylinder(d = rivet_d, h = thickness + 0.1, $fn = 22);
        rotate([0, 0, cut_a]) translate([cut_r, 0, -0.05])
            hull() {
                cylinder(d = cut_d, h = thickness + 0.1, $fn = 56);
                translate([5.5, 0, 0]) cylinder(d = 4.4, h = thickness + 0.1, $fn = 44);
            }
    }
}

// ---- "main guard" ----
if (is_undef(__LIB_MODE__)) {
    part_mar4();
}
